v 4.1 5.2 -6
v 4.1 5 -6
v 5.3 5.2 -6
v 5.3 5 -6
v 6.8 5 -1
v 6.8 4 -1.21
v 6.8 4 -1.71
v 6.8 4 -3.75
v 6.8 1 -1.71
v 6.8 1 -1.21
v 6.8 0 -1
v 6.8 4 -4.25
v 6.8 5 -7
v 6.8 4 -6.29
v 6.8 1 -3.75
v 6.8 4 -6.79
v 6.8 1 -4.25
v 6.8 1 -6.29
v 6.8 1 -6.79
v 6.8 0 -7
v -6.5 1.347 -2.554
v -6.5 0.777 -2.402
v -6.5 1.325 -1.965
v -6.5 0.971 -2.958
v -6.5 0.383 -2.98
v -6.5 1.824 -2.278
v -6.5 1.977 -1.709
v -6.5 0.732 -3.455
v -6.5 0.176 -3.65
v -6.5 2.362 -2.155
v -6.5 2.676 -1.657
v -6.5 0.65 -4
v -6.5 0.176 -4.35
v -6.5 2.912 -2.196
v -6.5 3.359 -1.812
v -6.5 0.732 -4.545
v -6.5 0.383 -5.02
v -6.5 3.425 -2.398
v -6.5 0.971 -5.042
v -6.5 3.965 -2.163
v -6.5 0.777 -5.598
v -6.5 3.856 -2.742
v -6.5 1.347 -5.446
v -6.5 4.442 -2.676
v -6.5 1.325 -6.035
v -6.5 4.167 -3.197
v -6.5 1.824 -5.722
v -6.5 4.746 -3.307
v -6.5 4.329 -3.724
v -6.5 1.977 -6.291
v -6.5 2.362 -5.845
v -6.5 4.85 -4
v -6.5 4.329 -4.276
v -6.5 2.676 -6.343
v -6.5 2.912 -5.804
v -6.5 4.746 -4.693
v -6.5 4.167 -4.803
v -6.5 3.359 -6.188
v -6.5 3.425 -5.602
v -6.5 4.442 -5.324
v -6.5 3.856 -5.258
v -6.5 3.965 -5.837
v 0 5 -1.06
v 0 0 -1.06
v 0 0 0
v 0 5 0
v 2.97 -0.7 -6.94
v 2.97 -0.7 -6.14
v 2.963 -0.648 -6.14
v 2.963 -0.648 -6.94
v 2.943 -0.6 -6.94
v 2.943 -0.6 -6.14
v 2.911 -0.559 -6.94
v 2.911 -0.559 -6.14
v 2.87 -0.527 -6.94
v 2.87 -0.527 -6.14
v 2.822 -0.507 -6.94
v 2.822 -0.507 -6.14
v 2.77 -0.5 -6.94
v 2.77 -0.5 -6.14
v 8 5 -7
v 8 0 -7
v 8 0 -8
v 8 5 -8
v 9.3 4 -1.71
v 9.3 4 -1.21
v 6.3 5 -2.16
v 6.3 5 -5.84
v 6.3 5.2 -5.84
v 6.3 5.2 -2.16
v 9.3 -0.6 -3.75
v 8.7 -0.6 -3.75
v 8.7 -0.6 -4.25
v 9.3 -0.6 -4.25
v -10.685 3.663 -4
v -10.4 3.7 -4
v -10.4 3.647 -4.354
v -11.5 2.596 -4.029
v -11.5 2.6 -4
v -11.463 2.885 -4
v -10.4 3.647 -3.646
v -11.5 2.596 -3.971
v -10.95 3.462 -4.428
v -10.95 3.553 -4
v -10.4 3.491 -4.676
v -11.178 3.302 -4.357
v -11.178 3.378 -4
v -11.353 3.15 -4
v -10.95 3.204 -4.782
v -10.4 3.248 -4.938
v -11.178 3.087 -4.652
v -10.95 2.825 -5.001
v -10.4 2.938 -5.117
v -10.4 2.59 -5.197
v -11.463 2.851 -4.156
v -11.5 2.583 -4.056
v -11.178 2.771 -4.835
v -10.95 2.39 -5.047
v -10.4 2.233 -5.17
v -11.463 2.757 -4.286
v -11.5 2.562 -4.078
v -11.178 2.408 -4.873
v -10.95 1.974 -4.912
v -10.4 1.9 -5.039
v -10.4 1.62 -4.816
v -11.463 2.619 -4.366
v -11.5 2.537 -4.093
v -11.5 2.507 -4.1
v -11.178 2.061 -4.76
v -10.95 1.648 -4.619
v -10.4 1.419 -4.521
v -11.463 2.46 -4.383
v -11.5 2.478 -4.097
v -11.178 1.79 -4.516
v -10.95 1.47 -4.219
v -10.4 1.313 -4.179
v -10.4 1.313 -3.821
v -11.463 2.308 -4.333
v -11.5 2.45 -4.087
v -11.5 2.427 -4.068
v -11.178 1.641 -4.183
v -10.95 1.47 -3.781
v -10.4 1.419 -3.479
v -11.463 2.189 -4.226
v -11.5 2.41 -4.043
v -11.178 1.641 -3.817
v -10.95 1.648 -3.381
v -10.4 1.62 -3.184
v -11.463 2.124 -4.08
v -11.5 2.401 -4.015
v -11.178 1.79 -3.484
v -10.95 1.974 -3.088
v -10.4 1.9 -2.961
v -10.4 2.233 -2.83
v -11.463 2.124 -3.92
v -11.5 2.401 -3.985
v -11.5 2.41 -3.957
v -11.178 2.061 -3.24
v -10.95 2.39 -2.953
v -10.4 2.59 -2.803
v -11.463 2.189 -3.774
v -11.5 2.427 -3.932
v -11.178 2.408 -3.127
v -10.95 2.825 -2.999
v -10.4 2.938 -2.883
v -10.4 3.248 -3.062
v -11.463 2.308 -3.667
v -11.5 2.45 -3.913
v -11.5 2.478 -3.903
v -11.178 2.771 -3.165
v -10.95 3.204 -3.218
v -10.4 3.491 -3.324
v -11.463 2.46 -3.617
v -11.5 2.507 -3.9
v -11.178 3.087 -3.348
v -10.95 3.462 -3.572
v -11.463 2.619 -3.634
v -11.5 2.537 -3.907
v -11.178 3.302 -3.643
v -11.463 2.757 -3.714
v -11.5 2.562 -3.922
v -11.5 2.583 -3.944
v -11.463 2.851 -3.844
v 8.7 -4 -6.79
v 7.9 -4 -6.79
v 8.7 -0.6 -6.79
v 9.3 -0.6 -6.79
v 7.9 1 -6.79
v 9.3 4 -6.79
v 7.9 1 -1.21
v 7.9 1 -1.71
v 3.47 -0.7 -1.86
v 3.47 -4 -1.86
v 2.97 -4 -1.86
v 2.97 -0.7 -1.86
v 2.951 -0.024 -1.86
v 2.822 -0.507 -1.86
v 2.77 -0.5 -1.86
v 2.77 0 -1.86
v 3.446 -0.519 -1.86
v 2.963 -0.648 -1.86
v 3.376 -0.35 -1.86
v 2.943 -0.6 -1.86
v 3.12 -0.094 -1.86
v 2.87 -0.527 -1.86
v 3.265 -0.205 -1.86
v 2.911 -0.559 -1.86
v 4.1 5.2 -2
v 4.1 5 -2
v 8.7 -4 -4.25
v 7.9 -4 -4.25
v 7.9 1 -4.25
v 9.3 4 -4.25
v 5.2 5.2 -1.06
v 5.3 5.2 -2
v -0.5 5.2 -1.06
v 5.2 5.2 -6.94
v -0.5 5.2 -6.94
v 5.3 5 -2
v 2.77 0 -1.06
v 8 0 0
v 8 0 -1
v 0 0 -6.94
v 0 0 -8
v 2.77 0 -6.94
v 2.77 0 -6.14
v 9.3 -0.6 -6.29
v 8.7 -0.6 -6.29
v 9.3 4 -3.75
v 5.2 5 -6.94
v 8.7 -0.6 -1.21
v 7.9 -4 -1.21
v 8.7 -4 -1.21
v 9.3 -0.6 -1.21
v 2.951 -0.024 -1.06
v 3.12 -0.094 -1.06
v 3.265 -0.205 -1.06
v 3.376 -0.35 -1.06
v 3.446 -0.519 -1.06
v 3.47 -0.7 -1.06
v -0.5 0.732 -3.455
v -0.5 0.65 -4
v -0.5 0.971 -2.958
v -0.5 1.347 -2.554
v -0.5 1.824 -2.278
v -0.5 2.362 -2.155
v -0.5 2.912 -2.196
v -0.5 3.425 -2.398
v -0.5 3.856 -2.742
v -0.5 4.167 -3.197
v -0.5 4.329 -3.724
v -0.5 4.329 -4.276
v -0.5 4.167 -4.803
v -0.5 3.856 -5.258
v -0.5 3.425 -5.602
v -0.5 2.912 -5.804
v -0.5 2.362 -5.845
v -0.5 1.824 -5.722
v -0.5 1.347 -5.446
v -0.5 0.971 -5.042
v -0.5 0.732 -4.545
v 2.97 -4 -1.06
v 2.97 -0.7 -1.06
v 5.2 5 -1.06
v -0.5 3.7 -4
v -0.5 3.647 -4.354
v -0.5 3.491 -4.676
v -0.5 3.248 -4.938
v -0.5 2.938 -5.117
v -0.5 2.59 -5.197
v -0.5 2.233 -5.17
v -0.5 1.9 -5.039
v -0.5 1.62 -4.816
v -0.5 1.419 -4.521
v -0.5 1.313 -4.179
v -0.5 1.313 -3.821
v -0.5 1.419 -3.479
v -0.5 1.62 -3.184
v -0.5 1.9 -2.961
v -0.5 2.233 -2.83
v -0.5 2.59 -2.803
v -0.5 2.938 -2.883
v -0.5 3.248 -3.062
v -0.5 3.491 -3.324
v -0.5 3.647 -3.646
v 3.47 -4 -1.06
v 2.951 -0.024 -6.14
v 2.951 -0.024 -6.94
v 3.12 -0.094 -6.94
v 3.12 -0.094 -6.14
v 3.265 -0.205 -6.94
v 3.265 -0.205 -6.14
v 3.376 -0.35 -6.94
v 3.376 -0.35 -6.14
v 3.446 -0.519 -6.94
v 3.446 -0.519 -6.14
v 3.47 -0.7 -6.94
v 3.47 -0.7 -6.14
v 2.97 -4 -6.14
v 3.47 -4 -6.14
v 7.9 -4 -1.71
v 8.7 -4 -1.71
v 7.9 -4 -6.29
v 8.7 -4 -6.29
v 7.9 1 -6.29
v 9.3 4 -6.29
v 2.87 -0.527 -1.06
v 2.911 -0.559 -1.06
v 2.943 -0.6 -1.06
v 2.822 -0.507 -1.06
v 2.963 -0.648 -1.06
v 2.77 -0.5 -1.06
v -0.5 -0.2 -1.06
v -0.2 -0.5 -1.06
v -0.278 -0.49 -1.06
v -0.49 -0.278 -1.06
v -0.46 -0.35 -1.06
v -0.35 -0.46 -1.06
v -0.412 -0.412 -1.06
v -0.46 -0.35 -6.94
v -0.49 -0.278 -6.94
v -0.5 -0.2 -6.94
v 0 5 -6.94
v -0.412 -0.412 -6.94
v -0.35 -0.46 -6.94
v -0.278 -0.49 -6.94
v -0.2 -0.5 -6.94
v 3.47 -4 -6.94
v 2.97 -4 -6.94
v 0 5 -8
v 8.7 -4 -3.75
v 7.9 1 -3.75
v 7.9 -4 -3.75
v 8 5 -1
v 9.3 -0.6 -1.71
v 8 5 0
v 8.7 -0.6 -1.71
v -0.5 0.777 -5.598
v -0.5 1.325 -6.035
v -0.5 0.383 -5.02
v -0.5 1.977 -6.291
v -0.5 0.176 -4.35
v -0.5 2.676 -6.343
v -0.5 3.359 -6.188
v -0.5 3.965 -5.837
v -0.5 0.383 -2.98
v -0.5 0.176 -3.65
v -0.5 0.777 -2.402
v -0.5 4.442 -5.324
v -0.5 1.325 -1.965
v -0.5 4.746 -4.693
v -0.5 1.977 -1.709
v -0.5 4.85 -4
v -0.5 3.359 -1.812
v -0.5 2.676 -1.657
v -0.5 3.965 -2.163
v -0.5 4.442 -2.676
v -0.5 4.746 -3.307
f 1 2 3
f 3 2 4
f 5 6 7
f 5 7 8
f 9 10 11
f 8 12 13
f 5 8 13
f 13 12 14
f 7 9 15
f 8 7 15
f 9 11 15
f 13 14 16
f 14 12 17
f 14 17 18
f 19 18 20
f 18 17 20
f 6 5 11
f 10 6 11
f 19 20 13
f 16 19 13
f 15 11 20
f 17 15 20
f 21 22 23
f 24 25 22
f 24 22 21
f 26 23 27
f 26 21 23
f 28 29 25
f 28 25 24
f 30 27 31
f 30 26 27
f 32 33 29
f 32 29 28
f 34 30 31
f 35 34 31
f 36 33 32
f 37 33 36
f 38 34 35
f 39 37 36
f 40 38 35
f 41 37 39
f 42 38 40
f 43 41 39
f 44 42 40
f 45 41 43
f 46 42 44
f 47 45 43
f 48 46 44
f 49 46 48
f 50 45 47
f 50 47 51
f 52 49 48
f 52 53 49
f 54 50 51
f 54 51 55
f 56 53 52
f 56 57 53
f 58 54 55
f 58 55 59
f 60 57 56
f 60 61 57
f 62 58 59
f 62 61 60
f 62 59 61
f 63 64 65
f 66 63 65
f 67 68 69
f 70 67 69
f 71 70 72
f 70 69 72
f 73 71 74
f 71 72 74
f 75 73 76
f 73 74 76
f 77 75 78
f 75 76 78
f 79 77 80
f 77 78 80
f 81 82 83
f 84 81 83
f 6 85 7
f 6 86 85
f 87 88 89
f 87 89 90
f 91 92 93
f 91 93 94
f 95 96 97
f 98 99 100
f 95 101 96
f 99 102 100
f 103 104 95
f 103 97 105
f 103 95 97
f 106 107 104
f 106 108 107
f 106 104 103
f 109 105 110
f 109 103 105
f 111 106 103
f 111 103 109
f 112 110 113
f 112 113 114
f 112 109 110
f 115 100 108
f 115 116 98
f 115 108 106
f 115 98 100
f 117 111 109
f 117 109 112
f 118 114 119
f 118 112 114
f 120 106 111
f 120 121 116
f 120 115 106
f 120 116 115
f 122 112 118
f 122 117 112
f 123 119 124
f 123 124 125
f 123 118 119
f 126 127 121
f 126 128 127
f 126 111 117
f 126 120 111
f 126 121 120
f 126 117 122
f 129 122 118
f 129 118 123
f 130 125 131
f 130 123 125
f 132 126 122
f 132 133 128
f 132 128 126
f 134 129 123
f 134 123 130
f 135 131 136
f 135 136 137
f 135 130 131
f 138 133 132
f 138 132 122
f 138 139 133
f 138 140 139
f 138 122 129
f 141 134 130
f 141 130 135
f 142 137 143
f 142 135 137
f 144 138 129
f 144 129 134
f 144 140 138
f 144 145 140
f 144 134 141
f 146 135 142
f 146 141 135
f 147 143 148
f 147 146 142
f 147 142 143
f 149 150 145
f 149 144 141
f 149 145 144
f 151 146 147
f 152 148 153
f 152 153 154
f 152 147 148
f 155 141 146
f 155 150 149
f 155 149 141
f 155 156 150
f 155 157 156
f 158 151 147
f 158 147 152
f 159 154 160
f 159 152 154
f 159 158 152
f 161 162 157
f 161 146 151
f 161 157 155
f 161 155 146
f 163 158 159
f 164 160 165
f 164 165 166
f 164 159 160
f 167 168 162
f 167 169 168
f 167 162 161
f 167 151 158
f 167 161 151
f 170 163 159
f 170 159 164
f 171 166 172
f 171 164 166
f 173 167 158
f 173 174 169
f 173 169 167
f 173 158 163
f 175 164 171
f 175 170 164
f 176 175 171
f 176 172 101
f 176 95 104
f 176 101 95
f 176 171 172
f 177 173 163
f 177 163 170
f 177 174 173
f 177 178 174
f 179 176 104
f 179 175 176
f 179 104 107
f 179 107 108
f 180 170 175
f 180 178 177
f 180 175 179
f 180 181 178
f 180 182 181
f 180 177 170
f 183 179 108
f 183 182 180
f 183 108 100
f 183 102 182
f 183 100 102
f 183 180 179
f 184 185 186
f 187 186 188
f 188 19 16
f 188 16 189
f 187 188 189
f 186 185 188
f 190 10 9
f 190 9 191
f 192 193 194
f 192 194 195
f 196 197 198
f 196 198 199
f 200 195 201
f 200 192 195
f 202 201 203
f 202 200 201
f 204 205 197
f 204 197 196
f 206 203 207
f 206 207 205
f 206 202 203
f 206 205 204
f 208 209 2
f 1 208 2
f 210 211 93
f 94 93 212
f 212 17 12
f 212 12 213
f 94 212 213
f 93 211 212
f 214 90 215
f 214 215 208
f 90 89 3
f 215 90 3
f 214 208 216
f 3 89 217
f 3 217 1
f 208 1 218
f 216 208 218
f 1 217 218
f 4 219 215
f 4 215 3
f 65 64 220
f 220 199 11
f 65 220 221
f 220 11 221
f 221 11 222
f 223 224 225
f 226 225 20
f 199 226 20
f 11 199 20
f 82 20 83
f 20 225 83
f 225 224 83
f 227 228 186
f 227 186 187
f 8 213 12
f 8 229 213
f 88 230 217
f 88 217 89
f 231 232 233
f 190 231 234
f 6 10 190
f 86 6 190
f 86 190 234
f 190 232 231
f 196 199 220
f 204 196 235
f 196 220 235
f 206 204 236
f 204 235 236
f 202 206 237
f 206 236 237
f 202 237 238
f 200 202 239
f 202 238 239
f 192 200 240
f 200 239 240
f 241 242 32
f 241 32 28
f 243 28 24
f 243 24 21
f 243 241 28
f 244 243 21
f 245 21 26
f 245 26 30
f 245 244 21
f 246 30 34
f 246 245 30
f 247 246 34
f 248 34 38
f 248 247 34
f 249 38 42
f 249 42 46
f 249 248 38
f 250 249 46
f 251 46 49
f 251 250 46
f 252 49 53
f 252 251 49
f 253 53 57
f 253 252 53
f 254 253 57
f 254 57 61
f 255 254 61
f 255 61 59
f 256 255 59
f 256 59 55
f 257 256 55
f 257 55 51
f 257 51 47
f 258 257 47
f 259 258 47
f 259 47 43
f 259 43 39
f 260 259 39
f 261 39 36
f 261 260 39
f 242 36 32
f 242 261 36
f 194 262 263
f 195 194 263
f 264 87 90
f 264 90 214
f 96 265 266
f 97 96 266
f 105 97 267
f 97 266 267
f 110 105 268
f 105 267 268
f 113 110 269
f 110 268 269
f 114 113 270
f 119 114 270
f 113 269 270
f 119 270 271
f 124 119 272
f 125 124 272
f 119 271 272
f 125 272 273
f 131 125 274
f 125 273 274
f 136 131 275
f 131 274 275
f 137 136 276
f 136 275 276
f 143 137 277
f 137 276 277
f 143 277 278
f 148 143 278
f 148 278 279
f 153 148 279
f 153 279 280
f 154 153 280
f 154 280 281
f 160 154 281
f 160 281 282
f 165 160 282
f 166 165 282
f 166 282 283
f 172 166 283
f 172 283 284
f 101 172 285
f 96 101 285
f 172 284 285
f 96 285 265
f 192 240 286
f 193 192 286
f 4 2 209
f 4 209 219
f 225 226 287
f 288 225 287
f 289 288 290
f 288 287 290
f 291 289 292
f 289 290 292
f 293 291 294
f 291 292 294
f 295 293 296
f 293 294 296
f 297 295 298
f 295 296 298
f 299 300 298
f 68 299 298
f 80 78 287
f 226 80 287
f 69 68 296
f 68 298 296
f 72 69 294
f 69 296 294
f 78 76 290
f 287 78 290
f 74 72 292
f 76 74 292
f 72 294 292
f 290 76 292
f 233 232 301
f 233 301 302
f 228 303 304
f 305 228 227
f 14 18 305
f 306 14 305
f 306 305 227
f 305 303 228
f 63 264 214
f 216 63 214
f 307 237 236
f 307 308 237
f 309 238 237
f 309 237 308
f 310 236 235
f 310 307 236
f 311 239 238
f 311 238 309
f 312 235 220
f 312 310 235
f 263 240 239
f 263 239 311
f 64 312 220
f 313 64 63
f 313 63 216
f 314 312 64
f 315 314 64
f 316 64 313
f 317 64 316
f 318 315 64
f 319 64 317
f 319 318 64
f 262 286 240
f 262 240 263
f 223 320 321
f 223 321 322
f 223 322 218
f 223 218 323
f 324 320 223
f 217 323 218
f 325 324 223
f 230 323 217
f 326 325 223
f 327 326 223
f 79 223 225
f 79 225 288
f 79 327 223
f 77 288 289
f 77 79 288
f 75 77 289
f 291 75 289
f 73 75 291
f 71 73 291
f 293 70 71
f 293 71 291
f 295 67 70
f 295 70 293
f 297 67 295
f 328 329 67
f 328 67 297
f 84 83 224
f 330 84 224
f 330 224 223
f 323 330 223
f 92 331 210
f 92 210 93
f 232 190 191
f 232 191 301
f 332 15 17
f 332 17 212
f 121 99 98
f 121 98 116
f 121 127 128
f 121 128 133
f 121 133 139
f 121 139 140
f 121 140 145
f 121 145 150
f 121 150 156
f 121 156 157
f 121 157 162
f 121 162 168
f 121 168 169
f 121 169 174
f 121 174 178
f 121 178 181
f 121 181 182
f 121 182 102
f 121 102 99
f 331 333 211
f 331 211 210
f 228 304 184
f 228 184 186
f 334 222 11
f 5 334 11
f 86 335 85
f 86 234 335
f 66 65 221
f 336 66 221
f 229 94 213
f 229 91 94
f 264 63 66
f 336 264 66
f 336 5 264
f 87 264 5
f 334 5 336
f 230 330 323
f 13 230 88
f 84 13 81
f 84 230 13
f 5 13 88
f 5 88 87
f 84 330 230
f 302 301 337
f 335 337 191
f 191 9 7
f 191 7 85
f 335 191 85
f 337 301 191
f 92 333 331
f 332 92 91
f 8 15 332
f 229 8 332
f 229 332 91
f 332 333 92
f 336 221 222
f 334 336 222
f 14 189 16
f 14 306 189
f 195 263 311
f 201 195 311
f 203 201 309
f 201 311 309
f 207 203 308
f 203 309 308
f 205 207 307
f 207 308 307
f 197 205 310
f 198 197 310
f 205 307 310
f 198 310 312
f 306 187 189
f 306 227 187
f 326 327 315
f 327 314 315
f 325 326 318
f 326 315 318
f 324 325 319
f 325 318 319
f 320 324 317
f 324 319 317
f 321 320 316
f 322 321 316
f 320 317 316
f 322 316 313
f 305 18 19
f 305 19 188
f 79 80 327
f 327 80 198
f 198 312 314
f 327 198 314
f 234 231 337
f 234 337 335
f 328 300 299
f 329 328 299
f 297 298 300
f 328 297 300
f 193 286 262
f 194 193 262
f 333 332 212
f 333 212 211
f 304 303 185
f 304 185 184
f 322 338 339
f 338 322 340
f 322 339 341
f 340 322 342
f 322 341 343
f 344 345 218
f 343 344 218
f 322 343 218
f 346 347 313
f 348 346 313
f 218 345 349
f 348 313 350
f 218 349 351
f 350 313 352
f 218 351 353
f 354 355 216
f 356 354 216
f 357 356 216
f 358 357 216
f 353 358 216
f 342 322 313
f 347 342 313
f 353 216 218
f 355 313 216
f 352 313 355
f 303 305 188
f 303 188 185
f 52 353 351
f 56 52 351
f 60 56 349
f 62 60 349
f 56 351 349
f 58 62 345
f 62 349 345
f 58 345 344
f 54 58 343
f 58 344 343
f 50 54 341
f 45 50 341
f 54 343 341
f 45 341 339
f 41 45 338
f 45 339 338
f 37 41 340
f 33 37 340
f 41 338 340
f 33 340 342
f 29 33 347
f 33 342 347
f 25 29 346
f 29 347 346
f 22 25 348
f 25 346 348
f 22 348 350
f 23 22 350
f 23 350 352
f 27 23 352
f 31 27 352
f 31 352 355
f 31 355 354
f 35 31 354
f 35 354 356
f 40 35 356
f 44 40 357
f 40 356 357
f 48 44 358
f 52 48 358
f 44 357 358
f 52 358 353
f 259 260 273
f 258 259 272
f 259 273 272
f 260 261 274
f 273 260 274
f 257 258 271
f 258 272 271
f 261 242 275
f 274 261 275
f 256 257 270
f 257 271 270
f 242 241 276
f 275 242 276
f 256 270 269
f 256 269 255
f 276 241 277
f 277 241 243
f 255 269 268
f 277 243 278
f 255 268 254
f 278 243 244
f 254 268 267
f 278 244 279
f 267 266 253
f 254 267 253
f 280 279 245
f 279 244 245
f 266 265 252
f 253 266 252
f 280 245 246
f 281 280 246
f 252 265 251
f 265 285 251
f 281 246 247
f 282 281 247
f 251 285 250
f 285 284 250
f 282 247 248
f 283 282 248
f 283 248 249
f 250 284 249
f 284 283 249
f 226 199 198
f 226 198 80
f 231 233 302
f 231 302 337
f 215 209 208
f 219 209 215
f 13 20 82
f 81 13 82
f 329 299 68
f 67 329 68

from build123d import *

# Parameters (mm, degrees)
BOSS_EXTRU_1_DEPTH         = 5
BOSS_EXTRU_2_DEPTH         = 0.25
BOSS_EXTRU_3_DEPTH         = 2.94
ESQUISSE6_W                = 4.28
ESQUISSE6_H                = 4
ENL_V_MAT_EXTRU_1_DEPTH    = 0.7
ESQUISSE7_R                = 2.35
ESQUISSE7_R_2              = 1.85
BOSS_EXTRU_4_DEPTH         = 6
ESQUISSE8_R                = 1.2
BOSS_EXTRU_5_DEPTH         = 11
CONG_1_R                   = 1.1
ESQUISSE9_W                = 1.2
ESQUISSE9_H                = 4
BOSS_EXTRU_6_DEPTH         = 0.2
R_P_TITION_LIN_AIRE1_COUNT = 2
R_P_TITION_LIN_AIRE1_PITCH = 2.54
R_P_TITION_LIN_AIRE2_COUNT = 2
R_P_TITION_LIN_AIRE2_PITCH = 2.54


with BuildPart() as part:
    # Esquisse1 → Boss.-Extru.1 (new body)
    with BuildSketch(Plane(origin=(0, 0, 0), x_dir=(1, 0, 0), z_dir=(0, 1, 0))):
        Polygon((0, 0), (8, 0), (8, 1), (6.8, 1), (6.8, 7), (8, 7), (8, 8), (0, 8), align=None)
    extrude(amount=BOSS_EXTRU_1_DEPTH)

    # Esquisse4 → Boss.-Extru.2 (add, symmetric)
    with BuildSketch(Plane.XY.offset(-4)):
        Polygon((6.8, 4), (6.8, 1), (7.9, 1), (7.9, -4), (8.7, -4), (8.7, -0.6), (9.3, -0.6), (9.3, 4), align=None)
    boss_extru_2 = extrude(amount=BOSS_EXTRU_2_DEPTH, both=True)

    # Esquisse5 → Boss.-Extru.3 (add, symmetric)
    with BuildSketch(Plane.XY.offset(-4)):
        with BuildLine():
            Line((0, 5.2), (0, 0))
            Line((0, 0), (2.77, 0))
            ThreePointArc((2.77, 0), (3.264974747, -0.205025253), (3.47, -0.7))
            Line((3.47, -0.7), (3.47, -4))
            Line((3.47, -4), (2.97, -4))
            Line((2.97, -4), (2.97, -0.7))
            ThreePointArc((2.97, -0.7), (2.911421356, -0.558578644), (2.77, -0.5))
            Line((2.77, -0.5), (-0.2, -0.5))
            ThreePointArc((-0.2, -0.5), (-0.412132034, -0.412132034), (-0.5, -0.2))
            Line((-0.5, -0.2), (-0.5, 5.2))
            Line((-0.5, 5.2), (0, 5.2))
        make_face()
    extrude(amount=BOSS_EXTRU_3_DEPTH, both=True)

    # Esquisse6 → Enlèv. mat.-Extru.1 (cut)
    with BuildSketch(Plane(origin=(3.47, 0, 0), x_dir=(0, 0, -1), z_dir=(1, 0, 0))):
        with Locations((4, -2)):
            Rectangle(ESQUISSE6_W, ESQUISSE6_H)
    extrude(amount=-ENL_V_MAT_EXTRU_1_DEPTH, mode=Mode.SUBTRACT)

    # Esquisse7 → Boss.-Extru.4 (add)
    with BuildSketch(Plane.ZY.offset(0.5)):
        with Locations(Location((-4, 2.5, 0), (0, 0, 90))):
            Circle(ESQUISSE7_R)
        with Locations(Location((-4, 2.5, 0), (0, 0, 270))):
            Circle(ESQUISSE7_R_2, mode=Mode.SUBTRACT)
    extrude(amount=BOSS_EXTRU_4_DEPTH)

    # Esquisse8 → Boss.-Extru.5 (add)
    with BuildSketch(Plane.ZY.offset(0.5)):
        with Locations(Location((-4, 2.5, 0), (0, 0, 90))):
            Circle(ESQUISSE8_R)
    extrude(amount=BOSS_EXTRU_5_DEPTH)

    # Congé1
    cong_1_edges = [part.edges().sort_by_distance(p)[0] for p in [
        (-11.5, 1.3, -4),
    ]]
    fillet(cong_1_edges, radius=CONG_1_R)

    # Esquisse9 → Boss.-Extru.6 (add)
    with BuildSketch(Plane(origin=(0, 5, 0), x_dir=(1, 0, 0), z_dir=(0, 1, 0))):
        Polygon((0, 6.94), (5.2, 6.94), (6.3, 5.84), (6.3, 2.16), (5.2, 1.06), (0, 1.06), align=None)
        with Locations((4.7, 4)):
            Rectangle(ESQUISSE9_W, ESQUISSE9_H, mode=Mode.SUBTRACT)
    extrude(amount=BOSS_EXTRU_6_DEPTH)

    # Répétition linéaire1: Boss.-Extru.2 ×2
    with Locations(*[(0, 0, -i * R_P_TITION_LIN_AIRE1_PITCH) for i in range(1, R_P_TITION_LIN_AIRE1_COUNT)]):
        add(boss_extru_2)

    # Répétition linéaire2: Boss.-Extru.2 ×2
    with Locations(*[(0, 0, i * R_P_TITION_LIN_AIRE2_PITCH) for i in range(1, R_P_TITION_LIN_AIRE2_COUNT)]):
        add(boss_extru_2)


solid = part.part
